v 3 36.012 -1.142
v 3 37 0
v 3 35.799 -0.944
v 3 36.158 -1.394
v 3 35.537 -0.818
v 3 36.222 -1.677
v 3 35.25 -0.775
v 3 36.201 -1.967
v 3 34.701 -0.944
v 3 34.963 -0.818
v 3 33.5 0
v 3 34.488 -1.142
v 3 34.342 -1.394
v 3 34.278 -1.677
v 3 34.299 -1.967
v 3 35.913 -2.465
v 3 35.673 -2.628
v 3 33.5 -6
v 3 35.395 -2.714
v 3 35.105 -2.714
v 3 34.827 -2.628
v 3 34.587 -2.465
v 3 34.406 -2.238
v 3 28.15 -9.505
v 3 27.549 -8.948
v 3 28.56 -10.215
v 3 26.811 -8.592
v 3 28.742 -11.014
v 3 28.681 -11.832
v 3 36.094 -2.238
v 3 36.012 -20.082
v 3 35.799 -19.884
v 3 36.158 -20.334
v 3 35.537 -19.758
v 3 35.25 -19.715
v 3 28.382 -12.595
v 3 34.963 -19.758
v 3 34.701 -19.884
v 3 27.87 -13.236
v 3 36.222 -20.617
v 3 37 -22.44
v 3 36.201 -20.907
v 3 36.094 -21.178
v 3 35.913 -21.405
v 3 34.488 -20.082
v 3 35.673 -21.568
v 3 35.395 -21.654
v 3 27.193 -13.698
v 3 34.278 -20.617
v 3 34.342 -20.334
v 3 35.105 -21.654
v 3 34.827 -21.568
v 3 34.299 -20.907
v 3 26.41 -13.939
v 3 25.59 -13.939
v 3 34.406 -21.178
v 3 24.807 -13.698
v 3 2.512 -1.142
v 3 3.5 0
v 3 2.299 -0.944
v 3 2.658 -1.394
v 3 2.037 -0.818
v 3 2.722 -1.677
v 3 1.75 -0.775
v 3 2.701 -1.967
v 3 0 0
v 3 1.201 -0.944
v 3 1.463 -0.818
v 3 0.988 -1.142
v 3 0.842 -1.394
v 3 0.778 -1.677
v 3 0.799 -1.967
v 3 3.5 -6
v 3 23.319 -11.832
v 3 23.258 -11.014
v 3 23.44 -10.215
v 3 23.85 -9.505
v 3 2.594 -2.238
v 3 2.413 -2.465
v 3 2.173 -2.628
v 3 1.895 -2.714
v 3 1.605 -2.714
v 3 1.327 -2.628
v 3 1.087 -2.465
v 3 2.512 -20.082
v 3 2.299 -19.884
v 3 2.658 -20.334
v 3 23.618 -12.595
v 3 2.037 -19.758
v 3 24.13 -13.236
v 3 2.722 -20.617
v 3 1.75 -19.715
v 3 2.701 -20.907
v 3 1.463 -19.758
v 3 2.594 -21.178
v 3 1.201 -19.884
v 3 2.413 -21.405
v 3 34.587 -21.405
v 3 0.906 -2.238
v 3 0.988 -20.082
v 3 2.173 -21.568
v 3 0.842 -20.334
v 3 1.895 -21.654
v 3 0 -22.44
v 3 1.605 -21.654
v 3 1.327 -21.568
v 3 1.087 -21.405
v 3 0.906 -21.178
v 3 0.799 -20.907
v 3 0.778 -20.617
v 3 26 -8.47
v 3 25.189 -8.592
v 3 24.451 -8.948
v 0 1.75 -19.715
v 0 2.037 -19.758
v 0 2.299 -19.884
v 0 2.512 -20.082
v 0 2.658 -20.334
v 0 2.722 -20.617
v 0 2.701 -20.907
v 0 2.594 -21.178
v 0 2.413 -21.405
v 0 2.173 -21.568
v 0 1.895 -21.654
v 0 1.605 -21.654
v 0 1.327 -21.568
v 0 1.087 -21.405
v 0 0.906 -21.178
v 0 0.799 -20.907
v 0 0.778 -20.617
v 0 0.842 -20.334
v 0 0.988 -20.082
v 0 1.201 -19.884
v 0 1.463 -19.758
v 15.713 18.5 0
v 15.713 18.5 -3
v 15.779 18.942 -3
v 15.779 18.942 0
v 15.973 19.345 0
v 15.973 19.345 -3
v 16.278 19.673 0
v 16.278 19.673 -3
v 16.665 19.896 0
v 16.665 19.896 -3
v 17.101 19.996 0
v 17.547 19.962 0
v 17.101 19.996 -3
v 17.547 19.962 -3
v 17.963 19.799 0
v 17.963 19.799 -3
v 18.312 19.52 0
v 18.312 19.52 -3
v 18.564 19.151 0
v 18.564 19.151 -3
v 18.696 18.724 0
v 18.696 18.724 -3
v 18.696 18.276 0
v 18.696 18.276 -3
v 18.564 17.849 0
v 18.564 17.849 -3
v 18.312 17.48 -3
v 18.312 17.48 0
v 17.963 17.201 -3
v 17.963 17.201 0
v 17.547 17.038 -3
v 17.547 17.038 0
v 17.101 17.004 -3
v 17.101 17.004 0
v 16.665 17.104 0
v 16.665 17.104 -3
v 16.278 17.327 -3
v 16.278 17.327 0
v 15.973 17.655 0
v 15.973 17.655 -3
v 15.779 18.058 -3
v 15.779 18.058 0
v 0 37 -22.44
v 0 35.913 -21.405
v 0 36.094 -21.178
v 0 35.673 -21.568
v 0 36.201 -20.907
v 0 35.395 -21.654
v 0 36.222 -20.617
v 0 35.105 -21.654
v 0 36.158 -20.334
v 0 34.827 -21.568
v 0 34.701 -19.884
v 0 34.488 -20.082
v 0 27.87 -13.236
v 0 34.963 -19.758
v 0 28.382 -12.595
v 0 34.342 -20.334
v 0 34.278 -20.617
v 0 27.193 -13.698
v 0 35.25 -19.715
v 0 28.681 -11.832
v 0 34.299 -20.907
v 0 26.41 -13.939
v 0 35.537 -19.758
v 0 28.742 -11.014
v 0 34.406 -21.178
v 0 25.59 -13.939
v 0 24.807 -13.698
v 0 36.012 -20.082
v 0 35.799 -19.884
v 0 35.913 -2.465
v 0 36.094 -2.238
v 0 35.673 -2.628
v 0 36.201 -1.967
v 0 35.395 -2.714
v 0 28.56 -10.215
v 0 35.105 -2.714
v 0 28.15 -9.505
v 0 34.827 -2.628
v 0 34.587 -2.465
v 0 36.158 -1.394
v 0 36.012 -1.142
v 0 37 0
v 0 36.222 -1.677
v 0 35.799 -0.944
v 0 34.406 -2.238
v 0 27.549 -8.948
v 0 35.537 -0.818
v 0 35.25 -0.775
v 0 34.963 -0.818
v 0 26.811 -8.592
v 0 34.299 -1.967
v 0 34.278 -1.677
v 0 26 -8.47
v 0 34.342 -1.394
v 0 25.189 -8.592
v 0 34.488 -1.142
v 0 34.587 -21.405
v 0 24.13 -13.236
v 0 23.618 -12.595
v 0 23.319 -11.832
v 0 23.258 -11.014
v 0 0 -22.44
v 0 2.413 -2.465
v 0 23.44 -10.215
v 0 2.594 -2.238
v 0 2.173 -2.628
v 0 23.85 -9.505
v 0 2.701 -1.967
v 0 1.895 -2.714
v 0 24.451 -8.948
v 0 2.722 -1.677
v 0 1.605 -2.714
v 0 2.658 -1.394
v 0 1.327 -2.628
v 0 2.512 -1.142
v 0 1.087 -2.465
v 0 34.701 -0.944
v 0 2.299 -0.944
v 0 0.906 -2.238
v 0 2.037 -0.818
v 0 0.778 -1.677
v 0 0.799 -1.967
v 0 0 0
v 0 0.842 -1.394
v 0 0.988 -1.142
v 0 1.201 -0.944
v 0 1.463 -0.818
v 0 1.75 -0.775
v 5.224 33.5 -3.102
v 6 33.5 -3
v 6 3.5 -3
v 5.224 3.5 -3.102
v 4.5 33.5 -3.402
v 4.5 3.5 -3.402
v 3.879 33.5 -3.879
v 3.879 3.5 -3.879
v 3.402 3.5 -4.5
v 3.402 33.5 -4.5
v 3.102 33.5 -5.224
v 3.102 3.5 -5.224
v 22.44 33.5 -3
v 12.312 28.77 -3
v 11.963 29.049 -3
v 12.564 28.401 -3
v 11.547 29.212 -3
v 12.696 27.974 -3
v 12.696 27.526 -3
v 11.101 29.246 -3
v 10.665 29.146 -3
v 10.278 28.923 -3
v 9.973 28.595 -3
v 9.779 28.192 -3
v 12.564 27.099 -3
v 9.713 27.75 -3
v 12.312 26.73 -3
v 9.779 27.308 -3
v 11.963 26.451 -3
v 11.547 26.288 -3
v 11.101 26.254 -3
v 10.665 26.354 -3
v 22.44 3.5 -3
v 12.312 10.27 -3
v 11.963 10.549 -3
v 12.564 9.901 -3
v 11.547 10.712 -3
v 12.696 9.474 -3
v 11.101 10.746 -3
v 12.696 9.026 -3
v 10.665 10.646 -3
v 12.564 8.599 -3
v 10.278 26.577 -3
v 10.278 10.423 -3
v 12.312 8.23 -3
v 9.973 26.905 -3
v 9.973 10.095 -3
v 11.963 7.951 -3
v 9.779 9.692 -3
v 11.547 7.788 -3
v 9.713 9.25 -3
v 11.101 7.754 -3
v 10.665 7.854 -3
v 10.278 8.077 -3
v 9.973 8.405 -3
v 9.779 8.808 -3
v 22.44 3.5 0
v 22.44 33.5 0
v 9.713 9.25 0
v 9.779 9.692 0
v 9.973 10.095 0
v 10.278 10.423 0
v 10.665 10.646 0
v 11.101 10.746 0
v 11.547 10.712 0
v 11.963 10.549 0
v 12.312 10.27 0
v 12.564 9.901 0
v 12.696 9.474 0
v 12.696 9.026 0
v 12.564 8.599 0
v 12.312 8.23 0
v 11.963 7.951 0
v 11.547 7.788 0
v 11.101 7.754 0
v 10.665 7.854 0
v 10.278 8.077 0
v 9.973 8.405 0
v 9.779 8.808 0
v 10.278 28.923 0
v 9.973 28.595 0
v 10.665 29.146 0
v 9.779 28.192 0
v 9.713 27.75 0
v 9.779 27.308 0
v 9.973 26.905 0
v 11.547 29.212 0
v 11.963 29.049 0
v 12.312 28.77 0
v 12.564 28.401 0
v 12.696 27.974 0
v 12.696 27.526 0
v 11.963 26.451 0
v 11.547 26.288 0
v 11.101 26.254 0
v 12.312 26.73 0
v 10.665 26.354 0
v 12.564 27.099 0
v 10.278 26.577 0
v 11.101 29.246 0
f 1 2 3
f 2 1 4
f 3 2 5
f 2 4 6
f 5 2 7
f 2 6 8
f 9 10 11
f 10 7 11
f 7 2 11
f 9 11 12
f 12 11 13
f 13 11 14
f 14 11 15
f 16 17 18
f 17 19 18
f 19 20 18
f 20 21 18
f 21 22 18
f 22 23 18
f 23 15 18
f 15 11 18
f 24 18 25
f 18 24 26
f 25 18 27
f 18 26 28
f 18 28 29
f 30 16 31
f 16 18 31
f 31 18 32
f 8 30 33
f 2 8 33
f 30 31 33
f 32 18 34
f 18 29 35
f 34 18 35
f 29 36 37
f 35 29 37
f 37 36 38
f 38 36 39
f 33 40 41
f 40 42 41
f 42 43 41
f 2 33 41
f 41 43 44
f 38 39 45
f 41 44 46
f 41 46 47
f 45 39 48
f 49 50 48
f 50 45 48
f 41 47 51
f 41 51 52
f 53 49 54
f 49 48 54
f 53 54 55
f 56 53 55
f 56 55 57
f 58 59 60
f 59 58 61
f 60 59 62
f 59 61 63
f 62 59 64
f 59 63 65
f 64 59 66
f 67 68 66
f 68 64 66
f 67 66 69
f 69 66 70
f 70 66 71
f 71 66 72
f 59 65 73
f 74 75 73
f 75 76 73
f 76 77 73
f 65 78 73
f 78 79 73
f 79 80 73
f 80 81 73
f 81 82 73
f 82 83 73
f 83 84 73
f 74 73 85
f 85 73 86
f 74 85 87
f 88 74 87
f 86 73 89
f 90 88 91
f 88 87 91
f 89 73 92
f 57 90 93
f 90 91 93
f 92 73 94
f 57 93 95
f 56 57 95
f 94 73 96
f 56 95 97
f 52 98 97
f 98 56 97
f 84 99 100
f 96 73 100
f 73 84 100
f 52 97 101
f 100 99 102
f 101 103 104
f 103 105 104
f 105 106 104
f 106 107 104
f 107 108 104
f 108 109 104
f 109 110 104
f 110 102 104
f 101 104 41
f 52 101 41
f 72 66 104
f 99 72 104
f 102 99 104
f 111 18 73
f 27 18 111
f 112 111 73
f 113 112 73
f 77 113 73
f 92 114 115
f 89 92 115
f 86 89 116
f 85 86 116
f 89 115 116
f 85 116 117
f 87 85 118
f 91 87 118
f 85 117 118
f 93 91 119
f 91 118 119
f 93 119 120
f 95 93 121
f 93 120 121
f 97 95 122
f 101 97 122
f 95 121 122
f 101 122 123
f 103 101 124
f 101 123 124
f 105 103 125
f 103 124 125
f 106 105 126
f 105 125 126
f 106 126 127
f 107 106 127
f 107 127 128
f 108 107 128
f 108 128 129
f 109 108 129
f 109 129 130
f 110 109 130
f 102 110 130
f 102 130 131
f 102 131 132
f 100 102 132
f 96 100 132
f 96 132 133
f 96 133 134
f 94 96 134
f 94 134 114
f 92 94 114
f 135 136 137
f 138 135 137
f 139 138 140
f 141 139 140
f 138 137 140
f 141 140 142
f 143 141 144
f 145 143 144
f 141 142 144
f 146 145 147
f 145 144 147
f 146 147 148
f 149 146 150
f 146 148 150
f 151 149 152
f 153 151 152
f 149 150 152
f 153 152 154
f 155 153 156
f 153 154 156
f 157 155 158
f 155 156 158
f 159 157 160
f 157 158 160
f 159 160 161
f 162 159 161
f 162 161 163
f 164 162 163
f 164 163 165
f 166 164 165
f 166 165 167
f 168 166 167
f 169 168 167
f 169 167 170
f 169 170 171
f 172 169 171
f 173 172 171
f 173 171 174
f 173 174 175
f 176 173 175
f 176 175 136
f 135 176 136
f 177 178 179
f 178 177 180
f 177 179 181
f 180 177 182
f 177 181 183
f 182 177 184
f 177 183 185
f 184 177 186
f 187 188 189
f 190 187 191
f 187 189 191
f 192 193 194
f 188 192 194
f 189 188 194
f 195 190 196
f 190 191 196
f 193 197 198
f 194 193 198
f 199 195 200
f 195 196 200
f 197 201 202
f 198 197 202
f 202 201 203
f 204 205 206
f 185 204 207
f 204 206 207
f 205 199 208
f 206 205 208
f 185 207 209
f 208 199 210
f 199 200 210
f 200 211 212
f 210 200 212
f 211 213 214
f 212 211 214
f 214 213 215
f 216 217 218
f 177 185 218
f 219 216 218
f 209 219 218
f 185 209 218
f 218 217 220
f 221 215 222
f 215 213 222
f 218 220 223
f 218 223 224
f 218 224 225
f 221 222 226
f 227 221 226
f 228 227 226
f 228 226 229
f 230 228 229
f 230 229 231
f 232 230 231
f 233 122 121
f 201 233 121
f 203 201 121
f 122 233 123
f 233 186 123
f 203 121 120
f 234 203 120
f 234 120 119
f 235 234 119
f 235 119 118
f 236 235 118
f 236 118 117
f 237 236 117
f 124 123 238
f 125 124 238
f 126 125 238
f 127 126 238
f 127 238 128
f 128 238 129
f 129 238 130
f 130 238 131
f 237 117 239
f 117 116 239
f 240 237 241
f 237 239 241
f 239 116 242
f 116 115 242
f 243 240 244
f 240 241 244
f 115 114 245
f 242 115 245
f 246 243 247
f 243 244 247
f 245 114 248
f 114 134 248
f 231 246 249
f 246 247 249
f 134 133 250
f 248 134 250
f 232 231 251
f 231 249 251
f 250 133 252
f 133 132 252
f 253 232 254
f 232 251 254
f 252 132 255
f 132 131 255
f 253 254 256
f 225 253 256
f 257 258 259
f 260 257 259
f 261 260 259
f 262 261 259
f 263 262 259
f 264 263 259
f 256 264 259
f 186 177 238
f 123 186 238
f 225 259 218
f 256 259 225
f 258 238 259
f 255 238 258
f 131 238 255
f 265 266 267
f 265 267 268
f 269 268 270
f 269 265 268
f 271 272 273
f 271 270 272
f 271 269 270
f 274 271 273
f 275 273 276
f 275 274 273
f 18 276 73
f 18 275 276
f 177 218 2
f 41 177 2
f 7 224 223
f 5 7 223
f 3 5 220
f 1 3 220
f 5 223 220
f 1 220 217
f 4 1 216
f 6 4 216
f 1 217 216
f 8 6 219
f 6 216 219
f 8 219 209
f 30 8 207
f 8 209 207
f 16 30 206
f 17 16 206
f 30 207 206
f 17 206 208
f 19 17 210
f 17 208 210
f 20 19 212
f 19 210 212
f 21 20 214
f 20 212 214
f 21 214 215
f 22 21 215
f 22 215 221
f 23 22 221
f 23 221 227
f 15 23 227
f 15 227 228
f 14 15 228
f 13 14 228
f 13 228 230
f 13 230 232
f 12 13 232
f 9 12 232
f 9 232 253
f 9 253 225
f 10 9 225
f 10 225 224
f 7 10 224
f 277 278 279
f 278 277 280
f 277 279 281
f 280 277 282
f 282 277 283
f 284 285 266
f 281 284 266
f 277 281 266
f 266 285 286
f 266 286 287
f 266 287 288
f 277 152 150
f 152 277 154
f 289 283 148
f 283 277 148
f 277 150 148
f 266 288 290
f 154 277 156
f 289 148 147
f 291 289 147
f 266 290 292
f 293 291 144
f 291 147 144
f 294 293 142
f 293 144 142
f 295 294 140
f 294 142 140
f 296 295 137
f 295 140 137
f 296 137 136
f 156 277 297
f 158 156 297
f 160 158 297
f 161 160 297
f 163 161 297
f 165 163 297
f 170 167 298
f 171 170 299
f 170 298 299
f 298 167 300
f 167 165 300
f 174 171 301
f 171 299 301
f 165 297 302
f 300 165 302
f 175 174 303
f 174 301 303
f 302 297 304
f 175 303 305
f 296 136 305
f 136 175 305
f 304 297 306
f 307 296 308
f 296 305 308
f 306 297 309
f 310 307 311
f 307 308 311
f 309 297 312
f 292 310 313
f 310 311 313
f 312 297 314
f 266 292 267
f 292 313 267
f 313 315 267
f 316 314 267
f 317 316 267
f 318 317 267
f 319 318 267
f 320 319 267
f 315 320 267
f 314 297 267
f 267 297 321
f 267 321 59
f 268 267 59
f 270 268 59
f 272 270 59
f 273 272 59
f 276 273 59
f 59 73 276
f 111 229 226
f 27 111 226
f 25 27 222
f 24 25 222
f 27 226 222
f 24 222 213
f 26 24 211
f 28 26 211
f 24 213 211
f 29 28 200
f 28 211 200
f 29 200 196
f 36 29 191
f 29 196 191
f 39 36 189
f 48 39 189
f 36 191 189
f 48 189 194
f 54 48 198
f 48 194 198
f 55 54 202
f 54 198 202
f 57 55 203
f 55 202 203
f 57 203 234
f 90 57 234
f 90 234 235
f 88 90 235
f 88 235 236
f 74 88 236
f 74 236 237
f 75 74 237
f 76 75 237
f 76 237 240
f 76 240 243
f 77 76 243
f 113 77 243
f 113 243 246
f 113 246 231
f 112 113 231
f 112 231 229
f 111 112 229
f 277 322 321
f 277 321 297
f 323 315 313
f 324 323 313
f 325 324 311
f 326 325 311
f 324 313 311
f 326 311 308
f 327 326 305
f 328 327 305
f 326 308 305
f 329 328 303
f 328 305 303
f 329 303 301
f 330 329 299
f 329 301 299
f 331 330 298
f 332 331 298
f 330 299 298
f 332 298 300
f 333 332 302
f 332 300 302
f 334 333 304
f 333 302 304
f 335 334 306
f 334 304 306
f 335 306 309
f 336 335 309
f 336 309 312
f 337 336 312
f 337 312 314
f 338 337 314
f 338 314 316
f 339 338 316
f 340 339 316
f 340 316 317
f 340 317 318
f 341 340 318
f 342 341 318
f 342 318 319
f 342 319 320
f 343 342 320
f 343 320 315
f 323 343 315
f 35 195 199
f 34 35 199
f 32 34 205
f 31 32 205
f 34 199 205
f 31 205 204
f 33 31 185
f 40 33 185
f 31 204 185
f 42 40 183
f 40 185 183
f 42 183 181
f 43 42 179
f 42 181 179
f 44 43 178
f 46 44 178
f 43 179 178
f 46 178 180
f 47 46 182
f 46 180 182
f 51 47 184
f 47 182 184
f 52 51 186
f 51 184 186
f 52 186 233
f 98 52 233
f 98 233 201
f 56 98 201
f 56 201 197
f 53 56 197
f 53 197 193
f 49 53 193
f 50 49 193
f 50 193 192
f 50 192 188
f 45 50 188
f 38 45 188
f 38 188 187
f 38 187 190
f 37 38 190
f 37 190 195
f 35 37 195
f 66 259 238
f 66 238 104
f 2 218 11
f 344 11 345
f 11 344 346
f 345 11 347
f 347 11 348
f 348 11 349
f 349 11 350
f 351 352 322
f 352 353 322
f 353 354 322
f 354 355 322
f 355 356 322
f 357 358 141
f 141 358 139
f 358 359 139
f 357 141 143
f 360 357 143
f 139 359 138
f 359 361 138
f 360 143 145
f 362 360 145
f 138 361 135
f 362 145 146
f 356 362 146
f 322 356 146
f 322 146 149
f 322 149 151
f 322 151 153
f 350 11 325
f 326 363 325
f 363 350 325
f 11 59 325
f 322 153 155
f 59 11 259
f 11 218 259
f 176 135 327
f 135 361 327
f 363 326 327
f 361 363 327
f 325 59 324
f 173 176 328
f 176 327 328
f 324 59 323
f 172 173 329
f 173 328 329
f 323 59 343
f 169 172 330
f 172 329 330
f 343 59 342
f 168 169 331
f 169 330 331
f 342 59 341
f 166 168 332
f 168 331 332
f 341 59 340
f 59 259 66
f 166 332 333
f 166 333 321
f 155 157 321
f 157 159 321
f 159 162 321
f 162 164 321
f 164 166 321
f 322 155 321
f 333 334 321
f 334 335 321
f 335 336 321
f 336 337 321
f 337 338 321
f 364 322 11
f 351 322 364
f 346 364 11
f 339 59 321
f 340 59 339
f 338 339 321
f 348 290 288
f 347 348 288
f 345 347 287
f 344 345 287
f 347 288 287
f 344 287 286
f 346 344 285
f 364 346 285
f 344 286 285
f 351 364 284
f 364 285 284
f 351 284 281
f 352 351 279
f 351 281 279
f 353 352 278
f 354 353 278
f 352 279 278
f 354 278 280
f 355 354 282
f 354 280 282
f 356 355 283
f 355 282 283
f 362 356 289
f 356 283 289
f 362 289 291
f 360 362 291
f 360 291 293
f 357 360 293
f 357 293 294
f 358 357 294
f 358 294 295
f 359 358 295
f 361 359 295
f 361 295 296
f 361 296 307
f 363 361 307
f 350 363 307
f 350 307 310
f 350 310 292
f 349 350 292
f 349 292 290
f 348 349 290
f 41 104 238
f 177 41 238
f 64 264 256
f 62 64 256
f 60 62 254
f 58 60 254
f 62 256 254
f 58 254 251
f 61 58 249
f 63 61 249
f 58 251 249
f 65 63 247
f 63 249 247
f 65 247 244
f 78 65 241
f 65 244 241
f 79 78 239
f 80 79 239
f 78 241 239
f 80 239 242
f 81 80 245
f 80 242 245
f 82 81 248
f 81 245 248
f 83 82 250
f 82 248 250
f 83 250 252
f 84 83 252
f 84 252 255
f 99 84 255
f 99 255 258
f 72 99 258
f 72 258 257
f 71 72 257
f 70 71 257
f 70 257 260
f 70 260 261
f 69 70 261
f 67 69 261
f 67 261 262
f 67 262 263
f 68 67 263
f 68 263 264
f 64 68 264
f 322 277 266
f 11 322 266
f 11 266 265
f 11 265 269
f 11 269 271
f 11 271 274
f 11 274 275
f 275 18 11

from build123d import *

# Parameters (mm, degrees)
BOSS_EXTRUDE1_DEPTH = 37
FILLET1_R           = 3
SKETCH2_R           = 1.5
SKETCH2_W           = 19.44
SKETCH2_H           = 3.5
CUT_EXTRUDE1_DEPTH  = 49.745330033
SKETCH3_R           = 0.975
SKETCH3_R_2         = 2.75
CUT_EXTRUDE2_DEPTH  = 49.745330033


with BuildPart() as part:
    # Sketch1 → Boss-Extrude1 (new body)
    with BuildSketch(Plane(origin=(0, 0, 0), x_dir=(1, 0, 0), z_dir=(0, 1, 0))):
        Polygon((0, 0), (22.44, 0), (22.44, 3), (3, 3), (3, 22.44), (0, 22.44), align=None)
    extrude(amount=BOSS_EXTRUDE1_DEPTH)

    # Fillet1
    fillet1_edges = [part.edges().sort_by_distance(p)[0] for p in [
        (3, 18.5, -3),
    ]]
    fillet(fillet1_edges, radius=FILLET1_R)

    # Sketch2 → Cut-Extrude1 (cut, through all)
    with BuildSketch(Plane(origin=(0, 0, -22.44), x_dir=(-1, 0, 0), z_dir=(0, 0, -1))):
        with Locations((-11.212785563, 27.75)):
            Circle(SKETCH2_R)
        with Locations((-17.212785563, 18.5)):
            Circle(SKETCH2_R)
        with Locations((-11.212785563, 9.25)):
            Circle(SKETCH2_R)
        with Locations((-12.72, 1.75)):
            Rectangle(SKETCH2_W, SKETCH2_H)
        with Locations((-12.72, 35.25)):
            Rectangle(SKETCH2_W, SKETCH2_H)
    extrude(amount=-CUT_EXTRUDE1_DEPTH, mode=Mode.SUBTRACT)

    # Sketch3 → Cut-Extrude2 (cut, through all)
    with BuildSketch(Plane.ZY):
        with Locations((-1.75, 35.25)):
            Circle(SKETCH3_R)
        with Locations((-1.75, 1.75)):
            Circle(SKETCH3_R)
        with Locations((-20.69, 1.75)):
            Circle(SKETCH3_R)
        with Locations((-20.69, 35.25)):
            Circle(SKETCH3_R)
        with Locations((-11.22, 26)):
            Circle(SKETCH3_R_2)
    extrude(amount=-CUT_EXTRUDE2_DEPTH, mode=Mode.SUBTRACT)


solid = part.part
